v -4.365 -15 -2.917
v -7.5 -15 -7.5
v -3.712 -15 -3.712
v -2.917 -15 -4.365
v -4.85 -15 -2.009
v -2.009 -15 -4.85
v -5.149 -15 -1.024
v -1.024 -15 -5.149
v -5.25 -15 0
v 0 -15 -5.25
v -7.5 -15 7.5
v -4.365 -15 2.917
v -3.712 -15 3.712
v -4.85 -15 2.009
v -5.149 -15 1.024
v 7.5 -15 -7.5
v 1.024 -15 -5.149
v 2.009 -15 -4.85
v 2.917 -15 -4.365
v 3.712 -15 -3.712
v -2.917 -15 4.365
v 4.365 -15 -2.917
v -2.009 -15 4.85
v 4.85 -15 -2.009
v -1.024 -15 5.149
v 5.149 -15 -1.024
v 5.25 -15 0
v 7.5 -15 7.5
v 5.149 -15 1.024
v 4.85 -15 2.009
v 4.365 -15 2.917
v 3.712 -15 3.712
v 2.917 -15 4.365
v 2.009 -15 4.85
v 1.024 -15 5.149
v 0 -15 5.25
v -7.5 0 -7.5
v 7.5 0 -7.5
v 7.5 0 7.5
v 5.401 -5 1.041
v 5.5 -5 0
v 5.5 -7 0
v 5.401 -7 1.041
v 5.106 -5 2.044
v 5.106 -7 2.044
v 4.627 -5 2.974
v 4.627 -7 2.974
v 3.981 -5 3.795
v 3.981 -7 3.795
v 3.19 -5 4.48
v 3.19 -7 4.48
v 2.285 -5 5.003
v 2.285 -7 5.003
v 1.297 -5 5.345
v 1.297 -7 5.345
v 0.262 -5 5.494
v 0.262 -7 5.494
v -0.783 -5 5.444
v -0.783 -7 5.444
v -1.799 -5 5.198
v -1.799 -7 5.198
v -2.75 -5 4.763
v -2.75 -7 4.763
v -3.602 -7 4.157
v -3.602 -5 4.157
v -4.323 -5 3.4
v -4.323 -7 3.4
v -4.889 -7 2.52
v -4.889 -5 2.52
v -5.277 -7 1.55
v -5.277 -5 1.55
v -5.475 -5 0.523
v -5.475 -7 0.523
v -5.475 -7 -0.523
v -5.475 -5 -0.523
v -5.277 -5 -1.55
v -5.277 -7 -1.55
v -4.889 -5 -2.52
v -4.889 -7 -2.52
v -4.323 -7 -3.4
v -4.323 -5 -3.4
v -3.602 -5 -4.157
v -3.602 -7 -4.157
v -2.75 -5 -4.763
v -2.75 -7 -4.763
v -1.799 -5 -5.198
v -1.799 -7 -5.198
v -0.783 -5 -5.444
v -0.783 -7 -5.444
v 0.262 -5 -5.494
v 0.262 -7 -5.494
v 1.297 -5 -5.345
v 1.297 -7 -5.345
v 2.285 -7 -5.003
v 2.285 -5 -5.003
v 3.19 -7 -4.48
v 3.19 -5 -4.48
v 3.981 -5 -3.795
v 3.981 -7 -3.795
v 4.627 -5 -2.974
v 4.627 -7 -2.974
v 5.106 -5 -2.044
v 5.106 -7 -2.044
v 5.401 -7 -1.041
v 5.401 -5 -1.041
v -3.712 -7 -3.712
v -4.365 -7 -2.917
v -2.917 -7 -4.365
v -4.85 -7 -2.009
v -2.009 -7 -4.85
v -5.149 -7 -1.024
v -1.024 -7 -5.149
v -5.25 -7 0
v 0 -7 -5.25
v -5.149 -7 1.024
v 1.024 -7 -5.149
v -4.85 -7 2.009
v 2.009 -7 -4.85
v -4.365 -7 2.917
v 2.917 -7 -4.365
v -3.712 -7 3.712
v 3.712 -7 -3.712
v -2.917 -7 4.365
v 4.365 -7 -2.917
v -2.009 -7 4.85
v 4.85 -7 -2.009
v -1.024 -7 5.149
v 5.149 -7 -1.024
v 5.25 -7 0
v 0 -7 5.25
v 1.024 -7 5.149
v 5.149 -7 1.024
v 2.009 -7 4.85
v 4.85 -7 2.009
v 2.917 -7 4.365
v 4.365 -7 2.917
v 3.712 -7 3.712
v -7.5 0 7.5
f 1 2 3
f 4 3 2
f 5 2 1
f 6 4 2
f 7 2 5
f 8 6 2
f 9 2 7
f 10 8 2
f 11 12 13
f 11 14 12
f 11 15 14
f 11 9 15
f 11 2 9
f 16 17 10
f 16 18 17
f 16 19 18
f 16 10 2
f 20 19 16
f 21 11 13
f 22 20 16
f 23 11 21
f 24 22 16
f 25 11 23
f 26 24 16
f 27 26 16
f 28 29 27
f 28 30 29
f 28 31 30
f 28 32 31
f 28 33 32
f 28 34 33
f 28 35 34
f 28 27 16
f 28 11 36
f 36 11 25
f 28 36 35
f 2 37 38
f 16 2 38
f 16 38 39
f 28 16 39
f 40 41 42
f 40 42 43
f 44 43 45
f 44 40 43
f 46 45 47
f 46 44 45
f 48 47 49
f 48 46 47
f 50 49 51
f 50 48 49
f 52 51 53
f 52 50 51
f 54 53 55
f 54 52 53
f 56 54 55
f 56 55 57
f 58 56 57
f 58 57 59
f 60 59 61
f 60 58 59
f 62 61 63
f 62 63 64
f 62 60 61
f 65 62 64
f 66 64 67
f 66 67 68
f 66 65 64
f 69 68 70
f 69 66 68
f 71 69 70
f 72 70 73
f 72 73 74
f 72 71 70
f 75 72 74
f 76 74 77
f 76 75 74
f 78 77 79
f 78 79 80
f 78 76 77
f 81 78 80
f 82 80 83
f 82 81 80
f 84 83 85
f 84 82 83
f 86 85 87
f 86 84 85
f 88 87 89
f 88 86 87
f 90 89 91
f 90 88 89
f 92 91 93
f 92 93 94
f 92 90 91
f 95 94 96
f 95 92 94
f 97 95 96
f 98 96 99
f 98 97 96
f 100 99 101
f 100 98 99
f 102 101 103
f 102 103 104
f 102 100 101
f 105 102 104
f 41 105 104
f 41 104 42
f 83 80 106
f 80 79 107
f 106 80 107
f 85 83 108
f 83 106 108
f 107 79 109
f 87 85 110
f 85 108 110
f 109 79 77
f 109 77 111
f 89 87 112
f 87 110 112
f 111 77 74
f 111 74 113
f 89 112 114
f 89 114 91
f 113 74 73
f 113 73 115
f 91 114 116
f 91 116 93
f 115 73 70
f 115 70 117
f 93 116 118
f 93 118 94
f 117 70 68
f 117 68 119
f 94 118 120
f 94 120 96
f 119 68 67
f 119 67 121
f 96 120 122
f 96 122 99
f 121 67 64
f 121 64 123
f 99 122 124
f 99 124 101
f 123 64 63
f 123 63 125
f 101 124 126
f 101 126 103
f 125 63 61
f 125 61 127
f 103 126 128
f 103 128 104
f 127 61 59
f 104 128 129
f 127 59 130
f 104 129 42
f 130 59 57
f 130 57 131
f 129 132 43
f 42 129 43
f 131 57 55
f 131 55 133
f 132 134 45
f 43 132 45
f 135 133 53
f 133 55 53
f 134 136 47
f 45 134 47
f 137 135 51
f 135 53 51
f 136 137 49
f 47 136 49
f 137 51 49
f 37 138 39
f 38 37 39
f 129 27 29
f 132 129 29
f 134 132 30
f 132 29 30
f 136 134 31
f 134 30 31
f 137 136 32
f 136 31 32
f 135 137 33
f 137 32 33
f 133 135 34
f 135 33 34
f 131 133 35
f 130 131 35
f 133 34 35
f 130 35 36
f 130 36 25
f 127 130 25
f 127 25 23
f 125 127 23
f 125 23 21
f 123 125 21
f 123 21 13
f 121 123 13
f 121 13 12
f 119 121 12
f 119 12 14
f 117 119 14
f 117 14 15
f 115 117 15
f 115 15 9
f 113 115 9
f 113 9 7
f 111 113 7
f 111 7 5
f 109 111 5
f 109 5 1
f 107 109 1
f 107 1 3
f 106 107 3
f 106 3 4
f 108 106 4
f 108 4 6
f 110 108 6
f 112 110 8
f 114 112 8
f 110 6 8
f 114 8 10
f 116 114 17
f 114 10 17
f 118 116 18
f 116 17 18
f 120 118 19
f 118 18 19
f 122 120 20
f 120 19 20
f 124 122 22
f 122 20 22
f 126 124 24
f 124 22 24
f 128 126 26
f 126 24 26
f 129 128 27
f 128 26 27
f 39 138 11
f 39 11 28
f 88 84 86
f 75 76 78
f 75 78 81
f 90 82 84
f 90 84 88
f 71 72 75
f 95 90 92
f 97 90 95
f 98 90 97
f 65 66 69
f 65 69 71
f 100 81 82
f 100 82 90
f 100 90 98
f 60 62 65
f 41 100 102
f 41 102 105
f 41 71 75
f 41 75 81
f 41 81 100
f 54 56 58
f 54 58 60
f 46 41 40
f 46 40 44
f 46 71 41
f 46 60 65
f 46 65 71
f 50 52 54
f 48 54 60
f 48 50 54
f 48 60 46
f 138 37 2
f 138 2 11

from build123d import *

# Parameters (mm, degrees)
F0_W     = 15
F0_H     = 15
F1_DEPTH = 15
F2_R     = 5.25
F3_DEPTH = 10
F4_R     = 5.5
F4_R_2   = 5.25
F5_DEPTH = 2


with BuildPart() as f1:
    # F0 (on Front) → F1 (new body)
    with BuildSketch(Plane.XZ):
        Rectangle(F0_W, F0_H)
    extrude(amount=F1_DEPTH)

    # F2 (on face) → F3 (cut)
    with BuildSketch(Plane.XZ.offset(15)):
        Circle(F2_R)
    extrude(amount=-F3_DEPTH, mode=Mode.SUBTRACT)

    # F4 (on face) → F5 (cut)
    with BuildSketch(Plane.XZ.offset(5)):
        Circle(F4_R)
        Circle(F4_R_2, mode=Mode.SUBTRACT)
    extrude(amount=F5_DEPTH, mode=Mode.SUBTRACT)


solid = f1.part
